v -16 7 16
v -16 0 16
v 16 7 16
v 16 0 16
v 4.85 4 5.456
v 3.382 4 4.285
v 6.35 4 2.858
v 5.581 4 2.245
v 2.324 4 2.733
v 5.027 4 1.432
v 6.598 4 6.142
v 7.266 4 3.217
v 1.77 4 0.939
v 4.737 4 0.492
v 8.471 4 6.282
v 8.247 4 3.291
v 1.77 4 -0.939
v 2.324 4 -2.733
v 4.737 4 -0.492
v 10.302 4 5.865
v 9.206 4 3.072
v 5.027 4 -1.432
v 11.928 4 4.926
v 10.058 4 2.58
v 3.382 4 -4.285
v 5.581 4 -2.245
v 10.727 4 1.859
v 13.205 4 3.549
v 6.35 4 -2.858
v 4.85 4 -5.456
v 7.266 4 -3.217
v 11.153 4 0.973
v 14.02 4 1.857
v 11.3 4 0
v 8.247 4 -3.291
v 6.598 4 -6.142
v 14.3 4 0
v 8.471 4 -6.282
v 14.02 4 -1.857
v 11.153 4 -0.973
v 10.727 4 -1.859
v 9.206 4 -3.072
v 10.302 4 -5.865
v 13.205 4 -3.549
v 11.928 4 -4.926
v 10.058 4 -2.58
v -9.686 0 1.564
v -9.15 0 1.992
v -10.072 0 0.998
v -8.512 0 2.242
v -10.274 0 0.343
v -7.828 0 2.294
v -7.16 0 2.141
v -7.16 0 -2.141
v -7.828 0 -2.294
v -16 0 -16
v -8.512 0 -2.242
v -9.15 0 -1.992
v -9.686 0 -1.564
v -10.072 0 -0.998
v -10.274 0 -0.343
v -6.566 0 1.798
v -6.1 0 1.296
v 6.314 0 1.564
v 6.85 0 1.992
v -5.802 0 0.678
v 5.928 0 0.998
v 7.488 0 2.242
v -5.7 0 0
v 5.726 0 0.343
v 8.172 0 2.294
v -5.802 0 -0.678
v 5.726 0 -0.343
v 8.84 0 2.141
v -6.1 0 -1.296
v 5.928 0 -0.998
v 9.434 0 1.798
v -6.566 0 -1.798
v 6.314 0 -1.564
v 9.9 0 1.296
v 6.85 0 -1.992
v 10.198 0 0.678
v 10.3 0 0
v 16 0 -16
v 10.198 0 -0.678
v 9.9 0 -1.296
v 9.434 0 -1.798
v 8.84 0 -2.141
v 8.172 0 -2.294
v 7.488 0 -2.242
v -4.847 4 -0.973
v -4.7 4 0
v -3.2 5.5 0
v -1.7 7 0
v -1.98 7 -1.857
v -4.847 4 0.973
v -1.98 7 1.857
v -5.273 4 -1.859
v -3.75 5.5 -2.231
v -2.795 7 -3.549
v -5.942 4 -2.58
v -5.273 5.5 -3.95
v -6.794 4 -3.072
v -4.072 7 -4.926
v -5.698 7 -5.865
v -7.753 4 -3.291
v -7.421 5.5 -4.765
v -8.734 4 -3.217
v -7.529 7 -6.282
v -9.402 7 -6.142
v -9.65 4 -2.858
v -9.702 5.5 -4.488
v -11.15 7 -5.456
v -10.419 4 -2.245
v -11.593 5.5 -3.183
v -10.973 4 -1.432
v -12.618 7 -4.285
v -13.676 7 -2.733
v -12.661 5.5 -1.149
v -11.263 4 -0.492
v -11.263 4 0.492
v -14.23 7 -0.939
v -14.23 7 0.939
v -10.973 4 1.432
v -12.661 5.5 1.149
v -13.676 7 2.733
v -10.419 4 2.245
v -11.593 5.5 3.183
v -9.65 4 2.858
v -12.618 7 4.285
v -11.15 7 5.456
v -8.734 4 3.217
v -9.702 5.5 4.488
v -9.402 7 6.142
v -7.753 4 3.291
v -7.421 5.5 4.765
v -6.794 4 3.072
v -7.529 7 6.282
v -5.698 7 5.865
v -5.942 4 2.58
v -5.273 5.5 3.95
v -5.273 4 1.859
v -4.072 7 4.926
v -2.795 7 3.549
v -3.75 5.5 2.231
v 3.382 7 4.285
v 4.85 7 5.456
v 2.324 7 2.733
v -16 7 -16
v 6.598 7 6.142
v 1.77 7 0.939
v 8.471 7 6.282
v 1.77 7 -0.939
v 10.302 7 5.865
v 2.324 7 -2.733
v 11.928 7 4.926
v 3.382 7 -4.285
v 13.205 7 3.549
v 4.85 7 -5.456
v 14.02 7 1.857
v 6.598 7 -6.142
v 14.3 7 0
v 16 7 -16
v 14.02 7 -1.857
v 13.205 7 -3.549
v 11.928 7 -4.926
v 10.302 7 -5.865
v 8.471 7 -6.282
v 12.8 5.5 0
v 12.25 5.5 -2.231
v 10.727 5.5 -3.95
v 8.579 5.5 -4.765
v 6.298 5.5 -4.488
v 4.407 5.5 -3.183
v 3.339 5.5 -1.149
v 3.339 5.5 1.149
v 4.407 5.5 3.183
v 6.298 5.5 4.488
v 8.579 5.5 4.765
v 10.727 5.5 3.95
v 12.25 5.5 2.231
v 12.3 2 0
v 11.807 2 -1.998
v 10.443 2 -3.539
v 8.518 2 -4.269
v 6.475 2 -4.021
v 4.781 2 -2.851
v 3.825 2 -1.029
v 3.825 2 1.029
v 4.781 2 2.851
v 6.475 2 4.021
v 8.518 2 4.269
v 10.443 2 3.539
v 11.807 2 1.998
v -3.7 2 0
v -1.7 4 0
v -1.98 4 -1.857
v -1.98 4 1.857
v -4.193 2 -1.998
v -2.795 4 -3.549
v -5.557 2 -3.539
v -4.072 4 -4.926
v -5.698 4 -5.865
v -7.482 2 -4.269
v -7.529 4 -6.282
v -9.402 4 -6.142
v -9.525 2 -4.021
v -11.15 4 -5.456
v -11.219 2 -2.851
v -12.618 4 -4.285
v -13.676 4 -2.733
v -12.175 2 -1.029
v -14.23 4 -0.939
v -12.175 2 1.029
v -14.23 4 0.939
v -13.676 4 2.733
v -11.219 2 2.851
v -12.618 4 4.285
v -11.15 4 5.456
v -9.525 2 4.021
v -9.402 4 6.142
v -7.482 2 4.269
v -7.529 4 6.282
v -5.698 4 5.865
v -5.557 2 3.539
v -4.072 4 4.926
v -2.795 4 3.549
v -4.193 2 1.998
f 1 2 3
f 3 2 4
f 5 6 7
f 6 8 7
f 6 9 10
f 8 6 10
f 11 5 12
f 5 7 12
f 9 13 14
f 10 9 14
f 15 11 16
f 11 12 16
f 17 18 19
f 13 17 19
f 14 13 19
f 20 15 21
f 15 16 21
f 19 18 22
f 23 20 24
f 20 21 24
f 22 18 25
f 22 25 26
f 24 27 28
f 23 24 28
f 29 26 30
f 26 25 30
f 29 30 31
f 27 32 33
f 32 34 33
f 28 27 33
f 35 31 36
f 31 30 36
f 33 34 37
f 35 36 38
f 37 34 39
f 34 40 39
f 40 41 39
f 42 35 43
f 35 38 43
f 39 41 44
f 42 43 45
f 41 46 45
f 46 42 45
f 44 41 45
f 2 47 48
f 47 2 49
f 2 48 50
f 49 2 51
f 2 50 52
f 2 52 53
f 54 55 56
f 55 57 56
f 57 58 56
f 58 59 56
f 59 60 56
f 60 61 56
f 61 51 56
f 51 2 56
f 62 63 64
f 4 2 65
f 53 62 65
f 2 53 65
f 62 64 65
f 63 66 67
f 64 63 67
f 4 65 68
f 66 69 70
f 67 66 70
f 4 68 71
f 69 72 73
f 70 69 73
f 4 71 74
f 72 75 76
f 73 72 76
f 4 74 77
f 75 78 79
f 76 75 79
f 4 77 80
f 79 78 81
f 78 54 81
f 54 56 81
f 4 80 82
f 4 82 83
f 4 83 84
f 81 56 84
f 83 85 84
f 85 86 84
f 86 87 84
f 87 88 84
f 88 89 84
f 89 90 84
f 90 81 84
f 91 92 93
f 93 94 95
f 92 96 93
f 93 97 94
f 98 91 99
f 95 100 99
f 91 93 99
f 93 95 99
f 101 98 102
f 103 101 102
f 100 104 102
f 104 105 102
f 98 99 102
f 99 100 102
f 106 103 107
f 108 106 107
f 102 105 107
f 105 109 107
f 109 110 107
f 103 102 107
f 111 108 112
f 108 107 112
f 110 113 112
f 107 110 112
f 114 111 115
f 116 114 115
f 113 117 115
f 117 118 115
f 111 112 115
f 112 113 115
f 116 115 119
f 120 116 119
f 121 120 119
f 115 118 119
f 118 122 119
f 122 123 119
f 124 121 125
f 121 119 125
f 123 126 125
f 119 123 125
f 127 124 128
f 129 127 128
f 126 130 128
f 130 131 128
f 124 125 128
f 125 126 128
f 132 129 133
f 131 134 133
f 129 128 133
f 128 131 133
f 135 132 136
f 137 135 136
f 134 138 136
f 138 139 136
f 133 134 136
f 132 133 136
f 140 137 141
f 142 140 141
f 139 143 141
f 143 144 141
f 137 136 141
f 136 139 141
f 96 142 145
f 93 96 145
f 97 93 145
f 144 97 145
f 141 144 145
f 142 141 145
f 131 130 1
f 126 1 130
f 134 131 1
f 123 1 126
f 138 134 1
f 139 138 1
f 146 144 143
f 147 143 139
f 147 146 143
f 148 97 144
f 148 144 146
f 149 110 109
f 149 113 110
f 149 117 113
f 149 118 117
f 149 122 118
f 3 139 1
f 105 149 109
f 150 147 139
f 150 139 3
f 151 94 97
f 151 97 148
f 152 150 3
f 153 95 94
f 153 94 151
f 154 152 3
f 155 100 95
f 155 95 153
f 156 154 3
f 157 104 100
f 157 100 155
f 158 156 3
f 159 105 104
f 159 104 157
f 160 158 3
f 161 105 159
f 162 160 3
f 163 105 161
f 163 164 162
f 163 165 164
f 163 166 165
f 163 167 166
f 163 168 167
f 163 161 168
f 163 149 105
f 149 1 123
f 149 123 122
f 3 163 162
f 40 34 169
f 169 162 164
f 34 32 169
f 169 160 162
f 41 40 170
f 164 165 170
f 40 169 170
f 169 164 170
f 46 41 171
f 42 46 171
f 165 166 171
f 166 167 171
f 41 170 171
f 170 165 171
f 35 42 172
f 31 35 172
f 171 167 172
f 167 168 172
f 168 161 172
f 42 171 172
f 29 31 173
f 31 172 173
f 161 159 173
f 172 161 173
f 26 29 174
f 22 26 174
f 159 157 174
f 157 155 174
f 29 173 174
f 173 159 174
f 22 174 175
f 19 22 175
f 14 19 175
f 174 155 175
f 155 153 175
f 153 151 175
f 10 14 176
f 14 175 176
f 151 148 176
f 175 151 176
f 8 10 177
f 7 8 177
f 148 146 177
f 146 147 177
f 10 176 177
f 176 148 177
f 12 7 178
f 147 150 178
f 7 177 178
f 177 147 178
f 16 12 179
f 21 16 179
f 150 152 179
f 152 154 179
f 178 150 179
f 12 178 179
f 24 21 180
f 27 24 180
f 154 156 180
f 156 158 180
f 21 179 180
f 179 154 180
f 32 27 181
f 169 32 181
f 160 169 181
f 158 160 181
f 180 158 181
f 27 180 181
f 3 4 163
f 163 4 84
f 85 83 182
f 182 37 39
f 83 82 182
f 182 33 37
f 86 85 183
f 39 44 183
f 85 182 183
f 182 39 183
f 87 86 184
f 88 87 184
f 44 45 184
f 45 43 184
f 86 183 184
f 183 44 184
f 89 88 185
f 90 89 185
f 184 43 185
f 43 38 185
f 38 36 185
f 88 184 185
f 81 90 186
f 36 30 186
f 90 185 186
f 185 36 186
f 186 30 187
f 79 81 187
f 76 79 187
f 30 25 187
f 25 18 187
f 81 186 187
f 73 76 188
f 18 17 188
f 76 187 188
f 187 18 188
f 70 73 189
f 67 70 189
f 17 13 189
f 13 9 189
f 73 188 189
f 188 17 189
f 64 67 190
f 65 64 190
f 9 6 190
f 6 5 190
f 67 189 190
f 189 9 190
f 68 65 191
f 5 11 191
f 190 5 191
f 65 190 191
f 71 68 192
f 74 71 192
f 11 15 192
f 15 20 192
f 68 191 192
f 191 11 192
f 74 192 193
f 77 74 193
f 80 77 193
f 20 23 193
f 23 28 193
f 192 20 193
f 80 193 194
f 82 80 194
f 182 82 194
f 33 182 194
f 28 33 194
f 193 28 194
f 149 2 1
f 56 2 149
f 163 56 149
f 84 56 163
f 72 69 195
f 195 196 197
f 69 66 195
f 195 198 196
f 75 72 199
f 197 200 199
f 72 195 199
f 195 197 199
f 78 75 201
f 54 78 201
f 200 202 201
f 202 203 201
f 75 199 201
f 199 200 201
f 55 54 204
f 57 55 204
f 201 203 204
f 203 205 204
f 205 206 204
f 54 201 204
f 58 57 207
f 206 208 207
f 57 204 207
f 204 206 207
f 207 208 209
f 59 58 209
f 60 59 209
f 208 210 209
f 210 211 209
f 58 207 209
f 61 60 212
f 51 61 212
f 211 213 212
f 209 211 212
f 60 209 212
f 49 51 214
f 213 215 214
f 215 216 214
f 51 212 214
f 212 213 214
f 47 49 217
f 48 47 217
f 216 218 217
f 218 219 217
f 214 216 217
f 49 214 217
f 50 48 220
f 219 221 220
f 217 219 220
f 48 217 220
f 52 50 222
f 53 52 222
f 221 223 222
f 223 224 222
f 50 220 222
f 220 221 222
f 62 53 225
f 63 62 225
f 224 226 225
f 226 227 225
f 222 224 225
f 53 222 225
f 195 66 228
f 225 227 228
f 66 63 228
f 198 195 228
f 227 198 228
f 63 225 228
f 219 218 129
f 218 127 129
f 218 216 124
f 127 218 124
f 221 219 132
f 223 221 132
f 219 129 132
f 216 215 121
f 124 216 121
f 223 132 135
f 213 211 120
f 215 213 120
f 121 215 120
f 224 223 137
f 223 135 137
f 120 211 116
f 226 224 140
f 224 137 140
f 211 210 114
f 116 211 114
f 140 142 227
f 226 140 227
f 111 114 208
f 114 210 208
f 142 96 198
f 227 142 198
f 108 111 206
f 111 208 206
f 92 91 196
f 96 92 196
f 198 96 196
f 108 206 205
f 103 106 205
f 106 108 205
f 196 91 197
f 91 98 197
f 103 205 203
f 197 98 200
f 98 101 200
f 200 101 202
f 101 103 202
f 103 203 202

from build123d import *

# Parameters (mm, degrees)
SKETCH1_W           = 32
SKETCH1_H           = 32
BOSS_EXTRUDE1_DEPTH = 7


# Read off the part's stored shape, not the designer's step: AdvancedHole1
with BuildPart() as part:
    # Sketch1 → Boss-Extrude1 (new body)
    with BuildSketch(Plane(origin=(0, 0, 0), x_dir=(1, 0, 0), z_dir=(0, 1, 0))):
        Rectangle(SKETCH1_W, SKETCH1_H)
    extrude(amount=BOSS_EXTRUDE1_DEPTH)

    # AdvancedHole1 outline → AdvancedHole1 (revolve, cut)
    with BuildSketch(Plane(origin=(8, 0, 0), x_dir=(1, 0, 0), z_dir=(0, 0, 1))):
        Polygon((6.3, 4), (3.3, 4), (6.3, 7), (0, 7), (0, 0), (2.3, 0), align=None)
    revolve(axis=Axis((8, 0, 0), (0, 1, 0)), mode=Mode.SUBTRACT)

    # AdvancedHole1 2 outline → AdvancedHole1 2 (revolve, cut)
    with BuildSketch(Plane(origin=(-8, 0, 0), x_dir=(1, 0, 0), z_dir=(0, 0, 1))):
        Polygon((6.3, 4), (3.3, 4), (6.3, 7), (0, 7), (0, 0), (2.3, 0), align=None)
    revolve(axis=Axis((-8, 0, 0), (0, 1, 0)), mode=Mode.SUBTRACT)


solid = part.part
